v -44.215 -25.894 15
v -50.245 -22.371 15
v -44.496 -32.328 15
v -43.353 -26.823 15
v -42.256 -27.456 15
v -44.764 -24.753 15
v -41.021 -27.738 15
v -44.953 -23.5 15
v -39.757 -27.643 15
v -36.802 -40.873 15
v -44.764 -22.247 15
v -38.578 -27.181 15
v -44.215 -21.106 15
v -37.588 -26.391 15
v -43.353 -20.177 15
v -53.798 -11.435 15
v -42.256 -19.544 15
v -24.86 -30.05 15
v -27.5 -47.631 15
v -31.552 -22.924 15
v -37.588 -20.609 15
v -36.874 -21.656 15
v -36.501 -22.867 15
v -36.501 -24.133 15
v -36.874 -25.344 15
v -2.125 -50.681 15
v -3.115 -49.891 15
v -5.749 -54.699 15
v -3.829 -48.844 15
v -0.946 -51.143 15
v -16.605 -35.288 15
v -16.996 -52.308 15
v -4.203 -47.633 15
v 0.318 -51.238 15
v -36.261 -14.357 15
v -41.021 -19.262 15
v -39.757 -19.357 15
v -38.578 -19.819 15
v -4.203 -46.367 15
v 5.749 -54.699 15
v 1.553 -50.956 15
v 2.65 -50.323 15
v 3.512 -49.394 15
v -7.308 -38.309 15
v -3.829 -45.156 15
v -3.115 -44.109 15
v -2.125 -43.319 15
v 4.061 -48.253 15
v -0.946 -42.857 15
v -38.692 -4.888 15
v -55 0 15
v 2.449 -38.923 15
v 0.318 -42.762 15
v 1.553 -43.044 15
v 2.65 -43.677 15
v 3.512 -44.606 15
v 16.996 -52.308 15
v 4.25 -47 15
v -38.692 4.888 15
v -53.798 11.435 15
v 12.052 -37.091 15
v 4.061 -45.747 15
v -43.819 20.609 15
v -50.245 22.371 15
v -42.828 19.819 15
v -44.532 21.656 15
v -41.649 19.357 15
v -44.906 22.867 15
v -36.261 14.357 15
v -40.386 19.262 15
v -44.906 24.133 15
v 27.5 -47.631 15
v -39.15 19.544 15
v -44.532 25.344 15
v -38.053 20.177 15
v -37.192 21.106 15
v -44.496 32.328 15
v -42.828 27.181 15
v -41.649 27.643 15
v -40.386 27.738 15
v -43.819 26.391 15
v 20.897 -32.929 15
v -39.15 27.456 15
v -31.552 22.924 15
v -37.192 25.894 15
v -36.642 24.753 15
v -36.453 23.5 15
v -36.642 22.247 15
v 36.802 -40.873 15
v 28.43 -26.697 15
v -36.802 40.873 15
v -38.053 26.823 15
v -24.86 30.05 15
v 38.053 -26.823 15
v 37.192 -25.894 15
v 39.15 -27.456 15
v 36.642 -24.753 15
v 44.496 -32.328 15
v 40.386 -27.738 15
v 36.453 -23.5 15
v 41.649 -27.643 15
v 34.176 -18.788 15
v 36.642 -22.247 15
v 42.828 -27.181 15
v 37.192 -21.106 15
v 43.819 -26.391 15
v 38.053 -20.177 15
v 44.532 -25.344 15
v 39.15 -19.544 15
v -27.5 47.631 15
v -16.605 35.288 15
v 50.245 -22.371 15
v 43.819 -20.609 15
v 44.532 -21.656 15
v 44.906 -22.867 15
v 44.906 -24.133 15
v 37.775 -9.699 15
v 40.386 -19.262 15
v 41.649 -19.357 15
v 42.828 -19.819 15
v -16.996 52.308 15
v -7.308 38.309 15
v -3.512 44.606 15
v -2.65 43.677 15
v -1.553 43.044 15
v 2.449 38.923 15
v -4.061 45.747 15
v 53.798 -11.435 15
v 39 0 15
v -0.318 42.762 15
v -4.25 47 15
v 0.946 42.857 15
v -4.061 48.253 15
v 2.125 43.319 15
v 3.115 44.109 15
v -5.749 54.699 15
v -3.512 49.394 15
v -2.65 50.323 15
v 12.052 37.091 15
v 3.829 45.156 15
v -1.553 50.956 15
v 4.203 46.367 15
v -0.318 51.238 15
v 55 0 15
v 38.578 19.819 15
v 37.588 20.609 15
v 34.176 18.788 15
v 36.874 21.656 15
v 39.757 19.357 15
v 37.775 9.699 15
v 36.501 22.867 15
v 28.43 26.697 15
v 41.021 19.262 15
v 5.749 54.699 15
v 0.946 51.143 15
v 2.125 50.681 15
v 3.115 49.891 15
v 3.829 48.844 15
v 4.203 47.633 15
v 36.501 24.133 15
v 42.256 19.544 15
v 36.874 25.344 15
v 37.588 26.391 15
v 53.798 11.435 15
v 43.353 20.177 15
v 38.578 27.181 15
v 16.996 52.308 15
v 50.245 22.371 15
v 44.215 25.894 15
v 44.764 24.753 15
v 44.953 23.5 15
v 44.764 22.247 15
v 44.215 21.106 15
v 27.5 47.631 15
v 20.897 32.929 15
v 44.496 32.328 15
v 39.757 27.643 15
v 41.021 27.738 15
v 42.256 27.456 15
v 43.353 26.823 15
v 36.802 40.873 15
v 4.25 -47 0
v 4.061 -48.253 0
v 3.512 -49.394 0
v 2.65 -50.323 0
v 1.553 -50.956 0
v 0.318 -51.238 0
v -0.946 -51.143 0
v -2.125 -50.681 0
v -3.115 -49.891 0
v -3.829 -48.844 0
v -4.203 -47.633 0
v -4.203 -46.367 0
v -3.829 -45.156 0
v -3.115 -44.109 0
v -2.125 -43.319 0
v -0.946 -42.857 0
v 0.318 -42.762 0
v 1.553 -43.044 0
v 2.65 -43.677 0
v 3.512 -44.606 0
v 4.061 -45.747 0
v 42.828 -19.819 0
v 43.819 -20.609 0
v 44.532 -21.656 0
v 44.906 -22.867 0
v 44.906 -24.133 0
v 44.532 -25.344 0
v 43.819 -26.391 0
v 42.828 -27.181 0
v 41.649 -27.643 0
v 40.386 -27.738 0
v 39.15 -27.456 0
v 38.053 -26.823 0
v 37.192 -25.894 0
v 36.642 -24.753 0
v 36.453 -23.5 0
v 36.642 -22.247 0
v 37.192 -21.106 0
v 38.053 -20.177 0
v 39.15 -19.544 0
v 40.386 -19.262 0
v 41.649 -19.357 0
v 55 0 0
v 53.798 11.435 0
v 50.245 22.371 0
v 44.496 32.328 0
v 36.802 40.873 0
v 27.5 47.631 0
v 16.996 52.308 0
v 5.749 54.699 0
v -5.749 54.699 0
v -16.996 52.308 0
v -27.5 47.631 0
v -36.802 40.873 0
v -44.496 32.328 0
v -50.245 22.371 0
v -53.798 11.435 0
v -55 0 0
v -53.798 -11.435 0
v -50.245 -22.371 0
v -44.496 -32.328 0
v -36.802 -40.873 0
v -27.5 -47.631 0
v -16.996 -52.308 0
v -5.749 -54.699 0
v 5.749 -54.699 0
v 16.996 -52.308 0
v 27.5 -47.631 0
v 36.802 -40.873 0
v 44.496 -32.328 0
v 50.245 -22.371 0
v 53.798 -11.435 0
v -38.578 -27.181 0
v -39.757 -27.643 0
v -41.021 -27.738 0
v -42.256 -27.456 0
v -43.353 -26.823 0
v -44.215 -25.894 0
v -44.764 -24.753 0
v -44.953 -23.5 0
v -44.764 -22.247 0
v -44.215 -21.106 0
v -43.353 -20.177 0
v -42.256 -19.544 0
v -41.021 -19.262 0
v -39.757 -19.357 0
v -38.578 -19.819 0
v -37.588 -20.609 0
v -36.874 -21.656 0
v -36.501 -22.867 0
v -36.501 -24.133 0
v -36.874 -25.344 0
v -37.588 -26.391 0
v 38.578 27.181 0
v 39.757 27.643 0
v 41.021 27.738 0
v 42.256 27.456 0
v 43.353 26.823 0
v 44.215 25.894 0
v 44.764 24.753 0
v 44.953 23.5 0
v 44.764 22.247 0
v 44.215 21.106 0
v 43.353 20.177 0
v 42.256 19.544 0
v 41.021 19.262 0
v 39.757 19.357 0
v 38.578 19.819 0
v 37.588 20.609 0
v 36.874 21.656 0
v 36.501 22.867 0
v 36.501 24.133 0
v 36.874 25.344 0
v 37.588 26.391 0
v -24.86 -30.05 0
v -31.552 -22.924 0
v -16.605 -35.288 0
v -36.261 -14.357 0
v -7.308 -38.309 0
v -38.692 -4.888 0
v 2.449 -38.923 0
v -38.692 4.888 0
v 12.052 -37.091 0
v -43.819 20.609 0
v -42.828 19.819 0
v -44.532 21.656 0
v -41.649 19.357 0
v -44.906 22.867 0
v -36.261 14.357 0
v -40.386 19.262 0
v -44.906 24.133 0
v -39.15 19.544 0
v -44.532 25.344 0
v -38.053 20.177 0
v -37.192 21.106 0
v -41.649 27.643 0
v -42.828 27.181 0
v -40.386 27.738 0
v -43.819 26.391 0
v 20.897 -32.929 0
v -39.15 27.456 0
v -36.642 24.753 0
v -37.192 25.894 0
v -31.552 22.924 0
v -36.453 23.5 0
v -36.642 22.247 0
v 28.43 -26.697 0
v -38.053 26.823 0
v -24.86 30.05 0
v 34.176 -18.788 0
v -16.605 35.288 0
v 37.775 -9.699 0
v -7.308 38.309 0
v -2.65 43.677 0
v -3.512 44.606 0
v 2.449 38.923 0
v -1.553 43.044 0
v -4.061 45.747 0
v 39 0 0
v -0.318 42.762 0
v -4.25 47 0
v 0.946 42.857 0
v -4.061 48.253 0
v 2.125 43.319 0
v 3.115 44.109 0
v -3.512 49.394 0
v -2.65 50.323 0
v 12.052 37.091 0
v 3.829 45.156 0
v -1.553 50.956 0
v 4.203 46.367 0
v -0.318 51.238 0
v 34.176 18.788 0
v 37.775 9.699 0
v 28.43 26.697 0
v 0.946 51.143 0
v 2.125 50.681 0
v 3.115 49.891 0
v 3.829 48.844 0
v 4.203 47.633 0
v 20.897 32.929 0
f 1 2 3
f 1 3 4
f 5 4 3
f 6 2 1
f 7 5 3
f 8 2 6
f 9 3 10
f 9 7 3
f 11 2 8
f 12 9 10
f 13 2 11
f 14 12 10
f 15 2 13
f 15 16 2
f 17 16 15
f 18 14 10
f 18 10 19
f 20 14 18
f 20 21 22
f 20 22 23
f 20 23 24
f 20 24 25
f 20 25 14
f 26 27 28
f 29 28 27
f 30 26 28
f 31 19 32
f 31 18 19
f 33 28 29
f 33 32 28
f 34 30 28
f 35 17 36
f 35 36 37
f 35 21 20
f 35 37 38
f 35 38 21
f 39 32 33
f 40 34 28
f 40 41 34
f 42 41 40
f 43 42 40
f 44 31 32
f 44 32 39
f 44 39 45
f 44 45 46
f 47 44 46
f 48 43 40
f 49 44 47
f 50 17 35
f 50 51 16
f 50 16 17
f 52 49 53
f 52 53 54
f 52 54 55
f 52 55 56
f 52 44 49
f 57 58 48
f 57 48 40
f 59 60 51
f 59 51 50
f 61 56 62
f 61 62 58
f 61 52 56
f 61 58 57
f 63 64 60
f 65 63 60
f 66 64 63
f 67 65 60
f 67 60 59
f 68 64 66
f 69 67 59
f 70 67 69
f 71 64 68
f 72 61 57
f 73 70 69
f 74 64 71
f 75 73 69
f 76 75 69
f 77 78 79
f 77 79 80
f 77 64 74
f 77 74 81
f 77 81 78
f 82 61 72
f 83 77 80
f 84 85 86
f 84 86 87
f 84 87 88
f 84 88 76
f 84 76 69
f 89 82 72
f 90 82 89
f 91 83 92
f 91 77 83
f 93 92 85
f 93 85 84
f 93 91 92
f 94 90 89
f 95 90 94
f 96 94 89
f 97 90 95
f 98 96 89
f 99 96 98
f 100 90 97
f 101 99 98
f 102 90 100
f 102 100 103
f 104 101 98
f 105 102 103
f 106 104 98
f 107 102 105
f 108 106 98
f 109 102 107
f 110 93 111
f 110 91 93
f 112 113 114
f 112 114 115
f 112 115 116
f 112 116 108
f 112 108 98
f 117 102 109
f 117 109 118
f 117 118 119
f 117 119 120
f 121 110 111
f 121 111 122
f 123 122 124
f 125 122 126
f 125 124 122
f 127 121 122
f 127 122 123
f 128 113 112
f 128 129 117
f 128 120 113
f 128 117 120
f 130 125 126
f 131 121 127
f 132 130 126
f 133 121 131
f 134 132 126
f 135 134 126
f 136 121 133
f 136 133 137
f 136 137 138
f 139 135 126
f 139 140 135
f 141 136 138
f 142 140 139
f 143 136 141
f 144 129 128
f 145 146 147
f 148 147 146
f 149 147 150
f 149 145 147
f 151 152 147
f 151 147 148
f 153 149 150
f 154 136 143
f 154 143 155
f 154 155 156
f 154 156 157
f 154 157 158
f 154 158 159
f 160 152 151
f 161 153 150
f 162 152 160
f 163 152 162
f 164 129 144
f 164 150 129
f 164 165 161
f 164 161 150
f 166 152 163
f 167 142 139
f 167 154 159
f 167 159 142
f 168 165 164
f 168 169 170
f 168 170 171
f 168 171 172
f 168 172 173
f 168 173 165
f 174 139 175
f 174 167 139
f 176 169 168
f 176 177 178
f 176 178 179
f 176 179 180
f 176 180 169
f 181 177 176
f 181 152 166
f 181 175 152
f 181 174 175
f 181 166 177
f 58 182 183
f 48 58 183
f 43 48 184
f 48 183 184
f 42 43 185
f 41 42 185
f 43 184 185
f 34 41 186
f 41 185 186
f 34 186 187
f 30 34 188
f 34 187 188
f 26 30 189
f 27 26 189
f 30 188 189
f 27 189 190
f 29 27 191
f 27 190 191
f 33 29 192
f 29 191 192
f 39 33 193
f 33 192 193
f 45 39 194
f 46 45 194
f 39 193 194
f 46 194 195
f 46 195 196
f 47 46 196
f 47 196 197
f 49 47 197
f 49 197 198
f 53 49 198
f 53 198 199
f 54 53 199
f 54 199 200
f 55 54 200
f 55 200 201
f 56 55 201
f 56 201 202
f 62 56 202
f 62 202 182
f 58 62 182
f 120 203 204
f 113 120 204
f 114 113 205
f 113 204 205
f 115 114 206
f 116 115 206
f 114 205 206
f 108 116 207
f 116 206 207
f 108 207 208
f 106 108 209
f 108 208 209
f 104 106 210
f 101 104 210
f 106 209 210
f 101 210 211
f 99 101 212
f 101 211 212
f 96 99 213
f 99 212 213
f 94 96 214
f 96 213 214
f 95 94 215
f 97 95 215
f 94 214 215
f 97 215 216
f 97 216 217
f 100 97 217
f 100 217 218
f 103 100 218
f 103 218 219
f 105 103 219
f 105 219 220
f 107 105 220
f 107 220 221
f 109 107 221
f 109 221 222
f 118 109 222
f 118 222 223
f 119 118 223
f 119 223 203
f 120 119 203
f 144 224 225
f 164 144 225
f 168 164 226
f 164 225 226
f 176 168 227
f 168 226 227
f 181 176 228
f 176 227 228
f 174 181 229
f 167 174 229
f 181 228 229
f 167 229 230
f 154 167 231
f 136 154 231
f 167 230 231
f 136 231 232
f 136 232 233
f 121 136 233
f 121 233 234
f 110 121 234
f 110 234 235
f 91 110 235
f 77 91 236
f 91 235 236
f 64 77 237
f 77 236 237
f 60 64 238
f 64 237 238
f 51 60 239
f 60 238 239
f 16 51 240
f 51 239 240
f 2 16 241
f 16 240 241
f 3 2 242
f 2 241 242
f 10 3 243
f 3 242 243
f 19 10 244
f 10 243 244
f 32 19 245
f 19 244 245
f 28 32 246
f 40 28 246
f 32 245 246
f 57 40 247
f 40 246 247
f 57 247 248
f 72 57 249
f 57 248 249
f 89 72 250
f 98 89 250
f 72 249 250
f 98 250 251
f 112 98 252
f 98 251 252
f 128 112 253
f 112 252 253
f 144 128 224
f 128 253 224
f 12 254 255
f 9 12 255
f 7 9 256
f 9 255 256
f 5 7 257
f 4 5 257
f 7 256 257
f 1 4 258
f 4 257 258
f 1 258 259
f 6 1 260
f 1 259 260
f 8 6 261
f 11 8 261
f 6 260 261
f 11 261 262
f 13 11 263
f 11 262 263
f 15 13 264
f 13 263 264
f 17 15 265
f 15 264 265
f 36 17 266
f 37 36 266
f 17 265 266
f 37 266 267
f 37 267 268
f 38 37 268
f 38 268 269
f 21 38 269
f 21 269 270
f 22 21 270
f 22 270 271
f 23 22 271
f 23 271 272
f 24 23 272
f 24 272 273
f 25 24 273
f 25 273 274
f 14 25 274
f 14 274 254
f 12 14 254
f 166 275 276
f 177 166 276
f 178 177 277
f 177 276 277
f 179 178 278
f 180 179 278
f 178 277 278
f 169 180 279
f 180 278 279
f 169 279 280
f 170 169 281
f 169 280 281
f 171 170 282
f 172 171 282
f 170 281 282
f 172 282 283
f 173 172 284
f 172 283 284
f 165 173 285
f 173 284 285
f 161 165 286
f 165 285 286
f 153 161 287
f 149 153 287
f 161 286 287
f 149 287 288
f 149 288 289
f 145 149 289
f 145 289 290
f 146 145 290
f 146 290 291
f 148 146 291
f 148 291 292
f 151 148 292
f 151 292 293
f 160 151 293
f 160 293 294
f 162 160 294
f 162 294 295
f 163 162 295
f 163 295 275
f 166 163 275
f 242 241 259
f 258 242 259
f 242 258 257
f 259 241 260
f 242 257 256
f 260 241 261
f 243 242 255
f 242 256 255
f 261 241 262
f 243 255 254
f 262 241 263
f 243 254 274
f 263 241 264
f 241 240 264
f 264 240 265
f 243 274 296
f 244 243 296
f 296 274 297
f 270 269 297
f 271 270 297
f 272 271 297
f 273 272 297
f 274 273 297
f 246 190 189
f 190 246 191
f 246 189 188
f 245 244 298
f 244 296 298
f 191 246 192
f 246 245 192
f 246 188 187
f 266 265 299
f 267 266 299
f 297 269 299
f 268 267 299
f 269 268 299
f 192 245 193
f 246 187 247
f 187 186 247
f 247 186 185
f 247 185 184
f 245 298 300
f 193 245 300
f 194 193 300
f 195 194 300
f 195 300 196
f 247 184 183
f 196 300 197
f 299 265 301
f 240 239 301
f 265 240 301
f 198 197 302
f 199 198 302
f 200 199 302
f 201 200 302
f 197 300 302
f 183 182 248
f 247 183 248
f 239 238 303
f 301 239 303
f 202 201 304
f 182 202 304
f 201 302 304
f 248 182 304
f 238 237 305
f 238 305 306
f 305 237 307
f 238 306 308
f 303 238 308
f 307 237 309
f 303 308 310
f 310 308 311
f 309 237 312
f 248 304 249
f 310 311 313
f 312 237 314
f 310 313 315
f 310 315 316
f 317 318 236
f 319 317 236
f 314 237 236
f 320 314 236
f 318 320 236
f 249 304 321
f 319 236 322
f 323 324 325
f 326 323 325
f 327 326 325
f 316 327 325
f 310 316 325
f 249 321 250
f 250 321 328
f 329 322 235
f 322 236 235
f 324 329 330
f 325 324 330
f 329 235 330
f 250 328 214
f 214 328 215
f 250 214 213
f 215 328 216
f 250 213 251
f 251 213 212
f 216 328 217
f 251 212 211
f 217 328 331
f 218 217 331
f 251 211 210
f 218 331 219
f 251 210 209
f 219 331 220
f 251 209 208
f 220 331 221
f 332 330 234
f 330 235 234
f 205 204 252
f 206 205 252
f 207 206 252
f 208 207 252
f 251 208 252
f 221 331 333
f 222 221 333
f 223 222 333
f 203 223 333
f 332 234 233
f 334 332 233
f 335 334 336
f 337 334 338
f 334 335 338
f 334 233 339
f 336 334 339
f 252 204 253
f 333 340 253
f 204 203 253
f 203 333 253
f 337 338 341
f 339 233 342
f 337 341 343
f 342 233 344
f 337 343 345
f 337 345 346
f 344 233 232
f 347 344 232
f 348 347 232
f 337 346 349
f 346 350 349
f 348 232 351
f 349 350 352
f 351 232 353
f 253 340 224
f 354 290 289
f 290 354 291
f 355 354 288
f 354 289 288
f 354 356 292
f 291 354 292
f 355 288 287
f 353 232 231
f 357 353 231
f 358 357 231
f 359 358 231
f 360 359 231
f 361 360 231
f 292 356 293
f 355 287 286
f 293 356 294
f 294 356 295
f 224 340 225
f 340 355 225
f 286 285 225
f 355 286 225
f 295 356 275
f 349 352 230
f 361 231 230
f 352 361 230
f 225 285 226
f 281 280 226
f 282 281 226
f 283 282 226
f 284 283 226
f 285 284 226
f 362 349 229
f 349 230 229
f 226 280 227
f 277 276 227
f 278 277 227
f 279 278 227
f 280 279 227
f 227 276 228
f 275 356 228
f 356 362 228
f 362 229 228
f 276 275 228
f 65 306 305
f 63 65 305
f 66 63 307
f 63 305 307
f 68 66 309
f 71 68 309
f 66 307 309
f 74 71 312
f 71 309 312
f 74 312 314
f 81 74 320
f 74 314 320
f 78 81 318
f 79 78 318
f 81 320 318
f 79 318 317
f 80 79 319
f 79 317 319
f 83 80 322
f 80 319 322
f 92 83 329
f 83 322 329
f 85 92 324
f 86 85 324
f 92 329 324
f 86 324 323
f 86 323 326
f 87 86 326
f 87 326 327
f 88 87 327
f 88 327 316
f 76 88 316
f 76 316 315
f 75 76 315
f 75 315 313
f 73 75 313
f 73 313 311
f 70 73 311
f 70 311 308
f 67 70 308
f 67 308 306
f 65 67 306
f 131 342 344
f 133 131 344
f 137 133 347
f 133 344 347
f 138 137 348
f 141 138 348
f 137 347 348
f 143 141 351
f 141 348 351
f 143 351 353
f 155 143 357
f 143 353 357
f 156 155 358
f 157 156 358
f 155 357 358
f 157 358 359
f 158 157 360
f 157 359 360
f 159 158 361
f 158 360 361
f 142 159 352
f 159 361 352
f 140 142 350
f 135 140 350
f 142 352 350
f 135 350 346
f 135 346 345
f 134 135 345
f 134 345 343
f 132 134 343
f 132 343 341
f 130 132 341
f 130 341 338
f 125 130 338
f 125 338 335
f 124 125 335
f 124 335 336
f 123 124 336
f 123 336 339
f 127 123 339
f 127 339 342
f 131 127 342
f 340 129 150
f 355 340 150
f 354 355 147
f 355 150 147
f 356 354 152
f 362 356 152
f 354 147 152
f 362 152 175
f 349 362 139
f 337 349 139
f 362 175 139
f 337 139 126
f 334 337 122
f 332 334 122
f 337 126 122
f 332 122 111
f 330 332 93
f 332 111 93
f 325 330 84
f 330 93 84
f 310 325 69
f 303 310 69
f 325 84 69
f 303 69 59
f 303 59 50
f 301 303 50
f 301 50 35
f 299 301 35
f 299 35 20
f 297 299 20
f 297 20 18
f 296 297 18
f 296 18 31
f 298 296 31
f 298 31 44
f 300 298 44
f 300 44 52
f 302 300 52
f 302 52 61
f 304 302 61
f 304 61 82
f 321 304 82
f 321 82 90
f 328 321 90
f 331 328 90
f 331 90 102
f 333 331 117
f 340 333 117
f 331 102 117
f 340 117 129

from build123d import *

# Parameters (mm, degrees)
ESQUISSE1_R                  = 55
BOSS_EXTRU_1_DEPTH           = 15
TROU_TARAUD_M101_D           = 8.5
R_P_TITION_CIRCULAIRE1_COUNT = 6
ESQUISSE4_R                  = 39
ENL_V_MAT_EXTRU_1_DEPTH      = 16


with BuildPart() as part:
    # Esquisse1 → Boss.-Extru.1 (new body)
    with BuildSketch(Plane.XY):
        Circle(ESQUISSE1_R)
    extrude(amount=BOSS_EXTRU_1_DEPTH)

    # Trou taraudé M101 (through all)
    with Locations(Plane.XY.offset(15)):
        with Locations((0, 47)):
            trou_taraud_m101 = Hole(TROU_TARAUD_M101_D / 2)

    # Répétition circulaire1: Trou taraudé M101 ×6 about axis
    r_p_tition_circulaire1_axis = Axis((0, 0, 0), (0, 0, 1))
    for i in range(1, R_P_TITION_CIRCULAIRE1_COUNT):
        add(trou_taraud_m101.rotate(r_p_tition_circulaire1_axis, i * 360 / R_P_TITION_CIRCULAIRE1_COUNT), mode=Mode.SUBTRACT)

    # Esquisse4 → Enlèv. mat.-Extru.1 (cut, through all)
    with BuildSketch(Plane.XY.offset(15)):
        Circle(ESQUISSE4_R)
    extrude(amount=-ENL_V_MAT_EXTRU_1_DEPTH, mode=Mode.SUBTRACT)


solid = part.part
